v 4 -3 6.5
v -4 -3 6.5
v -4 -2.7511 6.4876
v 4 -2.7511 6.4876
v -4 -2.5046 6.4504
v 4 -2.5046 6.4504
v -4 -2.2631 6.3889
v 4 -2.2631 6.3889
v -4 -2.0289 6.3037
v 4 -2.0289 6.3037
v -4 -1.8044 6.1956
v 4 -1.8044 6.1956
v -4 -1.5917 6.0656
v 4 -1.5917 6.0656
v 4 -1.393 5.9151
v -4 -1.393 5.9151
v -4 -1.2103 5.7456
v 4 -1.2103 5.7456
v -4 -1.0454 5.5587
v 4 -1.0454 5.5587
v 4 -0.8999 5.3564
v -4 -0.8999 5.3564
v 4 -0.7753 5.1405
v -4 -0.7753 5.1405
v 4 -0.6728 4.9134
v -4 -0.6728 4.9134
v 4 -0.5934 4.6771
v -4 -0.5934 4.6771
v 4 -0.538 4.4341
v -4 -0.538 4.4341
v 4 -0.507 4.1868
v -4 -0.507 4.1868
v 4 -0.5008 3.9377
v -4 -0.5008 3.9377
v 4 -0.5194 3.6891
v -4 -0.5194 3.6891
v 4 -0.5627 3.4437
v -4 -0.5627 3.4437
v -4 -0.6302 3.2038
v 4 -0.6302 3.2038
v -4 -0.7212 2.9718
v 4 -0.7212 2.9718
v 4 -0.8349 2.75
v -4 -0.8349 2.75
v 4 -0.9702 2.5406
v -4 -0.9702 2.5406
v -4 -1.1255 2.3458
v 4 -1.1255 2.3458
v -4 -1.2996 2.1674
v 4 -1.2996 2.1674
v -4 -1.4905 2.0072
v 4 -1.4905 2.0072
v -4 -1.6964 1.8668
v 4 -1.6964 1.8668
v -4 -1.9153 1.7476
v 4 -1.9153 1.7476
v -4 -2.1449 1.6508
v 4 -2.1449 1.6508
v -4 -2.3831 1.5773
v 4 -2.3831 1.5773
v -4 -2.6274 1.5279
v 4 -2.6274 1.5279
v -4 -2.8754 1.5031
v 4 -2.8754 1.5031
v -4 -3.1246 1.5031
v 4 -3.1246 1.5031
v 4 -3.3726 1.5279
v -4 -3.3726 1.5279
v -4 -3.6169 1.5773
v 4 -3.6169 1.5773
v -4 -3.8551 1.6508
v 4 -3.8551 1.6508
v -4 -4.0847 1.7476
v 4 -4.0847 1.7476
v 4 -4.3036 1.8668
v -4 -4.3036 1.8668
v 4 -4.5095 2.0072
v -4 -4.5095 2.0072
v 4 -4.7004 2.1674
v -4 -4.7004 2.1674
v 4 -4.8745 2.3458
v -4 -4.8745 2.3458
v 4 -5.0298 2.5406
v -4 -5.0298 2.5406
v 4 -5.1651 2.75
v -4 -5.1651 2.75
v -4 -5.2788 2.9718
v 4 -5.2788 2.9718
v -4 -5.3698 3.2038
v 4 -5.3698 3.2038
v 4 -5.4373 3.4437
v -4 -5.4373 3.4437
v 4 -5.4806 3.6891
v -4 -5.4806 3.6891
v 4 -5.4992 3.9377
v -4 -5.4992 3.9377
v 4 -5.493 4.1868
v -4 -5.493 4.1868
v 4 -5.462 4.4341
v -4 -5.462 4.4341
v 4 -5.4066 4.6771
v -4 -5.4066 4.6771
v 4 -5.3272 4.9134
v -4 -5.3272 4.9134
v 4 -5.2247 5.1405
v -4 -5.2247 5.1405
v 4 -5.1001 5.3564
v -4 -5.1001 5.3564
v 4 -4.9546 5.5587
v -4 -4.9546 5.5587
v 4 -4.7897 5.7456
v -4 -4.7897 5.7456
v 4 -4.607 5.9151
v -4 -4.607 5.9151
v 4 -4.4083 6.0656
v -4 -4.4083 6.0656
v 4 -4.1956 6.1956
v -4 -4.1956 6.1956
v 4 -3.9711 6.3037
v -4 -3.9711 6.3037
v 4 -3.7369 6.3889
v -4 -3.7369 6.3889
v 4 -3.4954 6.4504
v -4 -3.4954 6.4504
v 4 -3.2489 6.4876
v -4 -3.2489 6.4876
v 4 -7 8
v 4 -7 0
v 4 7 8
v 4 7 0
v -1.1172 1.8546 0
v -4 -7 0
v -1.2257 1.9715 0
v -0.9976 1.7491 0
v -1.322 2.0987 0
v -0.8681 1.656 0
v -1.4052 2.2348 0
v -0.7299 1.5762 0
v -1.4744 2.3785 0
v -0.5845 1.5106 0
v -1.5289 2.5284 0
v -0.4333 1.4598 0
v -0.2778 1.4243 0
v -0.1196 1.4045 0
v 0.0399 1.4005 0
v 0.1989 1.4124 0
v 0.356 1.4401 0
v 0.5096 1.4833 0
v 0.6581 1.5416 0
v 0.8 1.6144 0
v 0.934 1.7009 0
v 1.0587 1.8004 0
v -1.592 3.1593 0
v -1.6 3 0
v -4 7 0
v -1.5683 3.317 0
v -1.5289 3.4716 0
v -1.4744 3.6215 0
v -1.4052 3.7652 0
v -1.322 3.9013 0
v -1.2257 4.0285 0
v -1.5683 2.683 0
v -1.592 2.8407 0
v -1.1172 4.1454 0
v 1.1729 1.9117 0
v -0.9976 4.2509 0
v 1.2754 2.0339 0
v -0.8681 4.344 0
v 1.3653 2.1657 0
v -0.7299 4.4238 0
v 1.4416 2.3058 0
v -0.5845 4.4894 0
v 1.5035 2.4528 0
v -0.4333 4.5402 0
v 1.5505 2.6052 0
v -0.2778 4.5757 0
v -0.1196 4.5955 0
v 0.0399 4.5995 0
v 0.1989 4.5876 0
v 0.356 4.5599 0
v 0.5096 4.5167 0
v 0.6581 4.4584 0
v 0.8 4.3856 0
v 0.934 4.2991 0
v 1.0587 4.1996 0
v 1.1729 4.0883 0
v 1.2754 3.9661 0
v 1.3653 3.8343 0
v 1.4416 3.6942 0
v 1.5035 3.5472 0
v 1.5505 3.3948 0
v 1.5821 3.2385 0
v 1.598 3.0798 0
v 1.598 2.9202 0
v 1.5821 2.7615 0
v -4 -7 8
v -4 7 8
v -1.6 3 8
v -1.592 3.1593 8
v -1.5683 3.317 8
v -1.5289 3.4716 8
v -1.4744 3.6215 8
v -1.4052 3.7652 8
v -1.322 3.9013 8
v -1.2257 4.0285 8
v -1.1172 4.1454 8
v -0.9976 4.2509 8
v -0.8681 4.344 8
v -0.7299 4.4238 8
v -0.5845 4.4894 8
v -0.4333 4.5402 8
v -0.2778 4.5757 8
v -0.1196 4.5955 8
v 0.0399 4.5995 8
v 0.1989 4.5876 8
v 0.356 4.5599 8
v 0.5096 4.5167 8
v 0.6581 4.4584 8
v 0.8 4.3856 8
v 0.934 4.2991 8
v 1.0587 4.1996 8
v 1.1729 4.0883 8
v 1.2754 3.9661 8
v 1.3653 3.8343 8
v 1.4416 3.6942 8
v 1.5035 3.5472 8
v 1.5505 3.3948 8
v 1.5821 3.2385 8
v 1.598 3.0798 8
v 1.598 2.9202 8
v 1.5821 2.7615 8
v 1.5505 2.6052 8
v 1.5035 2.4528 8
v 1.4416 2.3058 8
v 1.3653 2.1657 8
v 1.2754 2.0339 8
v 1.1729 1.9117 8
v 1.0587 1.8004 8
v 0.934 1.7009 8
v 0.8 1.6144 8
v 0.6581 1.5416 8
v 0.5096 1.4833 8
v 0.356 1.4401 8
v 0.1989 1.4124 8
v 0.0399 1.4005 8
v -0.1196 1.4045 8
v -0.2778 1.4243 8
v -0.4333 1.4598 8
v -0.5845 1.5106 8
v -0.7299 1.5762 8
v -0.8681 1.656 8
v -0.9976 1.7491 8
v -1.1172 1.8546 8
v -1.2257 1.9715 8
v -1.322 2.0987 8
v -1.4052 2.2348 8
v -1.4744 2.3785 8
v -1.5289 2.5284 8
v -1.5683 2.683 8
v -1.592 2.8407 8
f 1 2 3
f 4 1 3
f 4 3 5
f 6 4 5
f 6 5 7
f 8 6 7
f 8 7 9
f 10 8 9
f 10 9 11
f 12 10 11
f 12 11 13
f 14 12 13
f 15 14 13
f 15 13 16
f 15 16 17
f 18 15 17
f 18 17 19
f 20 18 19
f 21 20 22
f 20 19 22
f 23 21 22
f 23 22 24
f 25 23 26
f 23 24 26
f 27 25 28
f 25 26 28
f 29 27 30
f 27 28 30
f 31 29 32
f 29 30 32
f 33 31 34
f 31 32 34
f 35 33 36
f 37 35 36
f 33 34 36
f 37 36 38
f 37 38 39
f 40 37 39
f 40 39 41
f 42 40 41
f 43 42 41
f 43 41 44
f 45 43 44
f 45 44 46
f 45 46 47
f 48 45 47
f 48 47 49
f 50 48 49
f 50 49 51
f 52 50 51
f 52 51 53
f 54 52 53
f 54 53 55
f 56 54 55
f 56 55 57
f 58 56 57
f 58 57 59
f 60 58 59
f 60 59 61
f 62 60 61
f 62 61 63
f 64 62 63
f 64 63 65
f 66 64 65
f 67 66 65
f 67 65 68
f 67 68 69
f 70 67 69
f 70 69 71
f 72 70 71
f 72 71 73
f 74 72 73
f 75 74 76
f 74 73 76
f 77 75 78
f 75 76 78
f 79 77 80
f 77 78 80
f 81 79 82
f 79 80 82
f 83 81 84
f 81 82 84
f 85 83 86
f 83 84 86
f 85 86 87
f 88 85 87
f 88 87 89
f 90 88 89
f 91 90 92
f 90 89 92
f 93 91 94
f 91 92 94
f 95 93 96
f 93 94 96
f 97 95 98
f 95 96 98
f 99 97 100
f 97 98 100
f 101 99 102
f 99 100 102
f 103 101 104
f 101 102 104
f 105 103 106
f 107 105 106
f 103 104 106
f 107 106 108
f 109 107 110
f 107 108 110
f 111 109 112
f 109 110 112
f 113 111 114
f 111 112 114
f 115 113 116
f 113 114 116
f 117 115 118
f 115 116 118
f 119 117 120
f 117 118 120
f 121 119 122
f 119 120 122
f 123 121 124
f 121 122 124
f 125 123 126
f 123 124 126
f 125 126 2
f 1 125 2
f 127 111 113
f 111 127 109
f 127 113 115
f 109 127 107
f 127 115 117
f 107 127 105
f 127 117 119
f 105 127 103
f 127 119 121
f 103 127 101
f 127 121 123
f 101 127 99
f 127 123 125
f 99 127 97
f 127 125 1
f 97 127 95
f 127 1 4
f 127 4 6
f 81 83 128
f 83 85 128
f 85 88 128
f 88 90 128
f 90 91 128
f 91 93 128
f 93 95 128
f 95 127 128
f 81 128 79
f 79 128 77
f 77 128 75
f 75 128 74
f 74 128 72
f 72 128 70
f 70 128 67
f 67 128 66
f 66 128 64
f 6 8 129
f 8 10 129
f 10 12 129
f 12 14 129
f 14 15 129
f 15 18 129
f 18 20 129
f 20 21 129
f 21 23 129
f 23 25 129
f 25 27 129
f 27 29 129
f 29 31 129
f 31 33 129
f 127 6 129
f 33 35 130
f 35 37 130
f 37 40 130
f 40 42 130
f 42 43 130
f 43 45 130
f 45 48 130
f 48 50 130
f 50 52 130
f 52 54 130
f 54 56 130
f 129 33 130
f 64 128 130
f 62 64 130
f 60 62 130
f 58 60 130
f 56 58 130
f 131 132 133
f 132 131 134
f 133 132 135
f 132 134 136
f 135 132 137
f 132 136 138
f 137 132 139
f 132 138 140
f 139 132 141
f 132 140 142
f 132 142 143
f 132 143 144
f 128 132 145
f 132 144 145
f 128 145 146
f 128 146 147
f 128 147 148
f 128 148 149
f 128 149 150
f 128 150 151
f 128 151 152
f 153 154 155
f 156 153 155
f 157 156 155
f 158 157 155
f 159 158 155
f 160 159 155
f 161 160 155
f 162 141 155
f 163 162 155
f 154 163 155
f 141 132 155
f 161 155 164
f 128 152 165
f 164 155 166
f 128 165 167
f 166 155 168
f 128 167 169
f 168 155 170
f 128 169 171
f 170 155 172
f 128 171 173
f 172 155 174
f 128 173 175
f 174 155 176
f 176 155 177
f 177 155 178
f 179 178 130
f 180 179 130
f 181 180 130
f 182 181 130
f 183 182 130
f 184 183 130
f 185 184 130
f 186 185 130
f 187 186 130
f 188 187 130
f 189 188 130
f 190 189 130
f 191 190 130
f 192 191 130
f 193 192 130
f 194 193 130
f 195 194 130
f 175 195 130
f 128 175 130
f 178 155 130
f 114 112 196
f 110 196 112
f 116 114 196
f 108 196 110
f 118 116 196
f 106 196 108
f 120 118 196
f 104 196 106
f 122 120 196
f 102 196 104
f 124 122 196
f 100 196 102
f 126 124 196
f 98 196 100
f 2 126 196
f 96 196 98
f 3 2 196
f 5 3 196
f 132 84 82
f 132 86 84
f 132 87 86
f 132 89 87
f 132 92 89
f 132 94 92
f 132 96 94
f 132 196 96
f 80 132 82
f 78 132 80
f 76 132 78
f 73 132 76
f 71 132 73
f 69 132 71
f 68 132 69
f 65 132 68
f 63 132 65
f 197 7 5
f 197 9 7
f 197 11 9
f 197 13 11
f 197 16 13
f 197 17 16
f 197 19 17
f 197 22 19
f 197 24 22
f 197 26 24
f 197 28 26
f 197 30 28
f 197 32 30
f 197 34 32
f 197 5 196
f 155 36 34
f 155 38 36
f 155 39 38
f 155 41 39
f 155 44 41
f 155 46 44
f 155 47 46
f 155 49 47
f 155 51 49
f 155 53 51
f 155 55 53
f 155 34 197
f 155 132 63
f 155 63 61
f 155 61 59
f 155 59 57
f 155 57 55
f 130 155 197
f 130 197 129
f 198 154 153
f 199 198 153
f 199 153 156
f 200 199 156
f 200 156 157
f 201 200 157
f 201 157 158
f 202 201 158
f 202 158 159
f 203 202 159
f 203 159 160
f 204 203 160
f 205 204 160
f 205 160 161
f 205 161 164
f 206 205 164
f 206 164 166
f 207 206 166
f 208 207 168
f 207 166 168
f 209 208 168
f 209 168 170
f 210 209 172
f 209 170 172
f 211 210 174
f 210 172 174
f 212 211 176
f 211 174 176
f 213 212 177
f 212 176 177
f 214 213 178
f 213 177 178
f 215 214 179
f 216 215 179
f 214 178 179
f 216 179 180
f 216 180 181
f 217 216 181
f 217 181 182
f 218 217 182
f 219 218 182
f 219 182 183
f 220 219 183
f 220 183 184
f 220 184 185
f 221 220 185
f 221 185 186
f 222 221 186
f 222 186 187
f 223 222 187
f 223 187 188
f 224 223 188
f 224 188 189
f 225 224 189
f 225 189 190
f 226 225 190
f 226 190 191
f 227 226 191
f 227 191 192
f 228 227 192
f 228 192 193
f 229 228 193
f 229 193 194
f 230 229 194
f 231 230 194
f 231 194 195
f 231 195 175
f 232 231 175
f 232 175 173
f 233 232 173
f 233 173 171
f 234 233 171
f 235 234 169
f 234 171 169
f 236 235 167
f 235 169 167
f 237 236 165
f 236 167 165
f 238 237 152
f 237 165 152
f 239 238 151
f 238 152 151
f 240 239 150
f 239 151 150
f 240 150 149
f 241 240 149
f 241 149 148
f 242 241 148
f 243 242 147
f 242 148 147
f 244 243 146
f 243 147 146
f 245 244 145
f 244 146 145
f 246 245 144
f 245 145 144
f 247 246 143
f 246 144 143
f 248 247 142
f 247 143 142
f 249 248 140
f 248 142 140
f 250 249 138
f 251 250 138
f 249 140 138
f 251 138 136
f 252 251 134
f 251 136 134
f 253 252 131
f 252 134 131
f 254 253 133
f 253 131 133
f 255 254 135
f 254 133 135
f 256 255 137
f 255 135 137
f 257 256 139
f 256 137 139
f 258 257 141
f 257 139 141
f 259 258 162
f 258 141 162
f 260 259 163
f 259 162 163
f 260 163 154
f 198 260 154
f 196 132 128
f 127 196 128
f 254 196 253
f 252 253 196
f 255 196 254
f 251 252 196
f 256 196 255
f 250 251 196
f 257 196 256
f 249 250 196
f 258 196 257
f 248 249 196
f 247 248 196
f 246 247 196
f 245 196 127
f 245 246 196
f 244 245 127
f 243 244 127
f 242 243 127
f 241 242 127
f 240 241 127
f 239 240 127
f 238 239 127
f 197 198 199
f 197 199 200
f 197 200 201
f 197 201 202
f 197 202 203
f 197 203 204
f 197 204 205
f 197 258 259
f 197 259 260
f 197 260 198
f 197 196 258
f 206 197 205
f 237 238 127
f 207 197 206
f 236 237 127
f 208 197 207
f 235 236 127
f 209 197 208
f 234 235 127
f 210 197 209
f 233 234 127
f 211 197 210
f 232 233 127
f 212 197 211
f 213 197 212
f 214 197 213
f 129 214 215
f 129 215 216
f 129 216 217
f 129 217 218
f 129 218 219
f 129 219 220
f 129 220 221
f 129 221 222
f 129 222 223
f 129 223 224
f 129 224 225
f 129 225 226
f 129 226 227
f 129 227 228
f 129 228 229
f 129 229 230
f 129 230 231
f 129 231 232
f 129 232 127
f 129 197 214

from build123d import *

# Parameters (mm, degrees)
SKETCH1_W           = 8
SKETCH1_H           = 14
BOSS_EXTRUDE1_DEPTH = 8
SKETCH2_R           = 1.6
CUT_EXTRUDE1_DEPTH  = 9
SKETCH4_R           = 2.5
CUT_EXTRUDE2_DEPTH  = 9


with BuildPart() as part:
    # Sketch1 → Boss-Extrude1 (new body)
    with BuildSketch(Plane.XY):
        Rectangle(SKETCH1_W, SKETCH1_H)
    extrude(amount=BOSS_EXTRUDE1_DEPTH)

    # Sketch2 → Cut-Extrude1 (cut, through all)
    with BuildSketch(Plane(origin=(0, 0, 0), x_dir=(-1, 0, 0), z_dir=(0, 0, -1))):
        with Locations((0, 3)):
            Circle(SKETCH2_R)
    extrude(amount=-CUT_EXTRUDE1_DEPTH, mode=Mode.SUBTRACT)

    # Sketch4 → Cut-Extrude2 (cut, through all)
    with BuildSketch(Plane.ZY.offset(4)):
        with Locations((4, -3)):
            Circle(SKETCH4_R)
    extrude(amount=-CUT_EXTRUDE2_DEPTH, mode=Mode.SUBTRACT)


solid = part.part
